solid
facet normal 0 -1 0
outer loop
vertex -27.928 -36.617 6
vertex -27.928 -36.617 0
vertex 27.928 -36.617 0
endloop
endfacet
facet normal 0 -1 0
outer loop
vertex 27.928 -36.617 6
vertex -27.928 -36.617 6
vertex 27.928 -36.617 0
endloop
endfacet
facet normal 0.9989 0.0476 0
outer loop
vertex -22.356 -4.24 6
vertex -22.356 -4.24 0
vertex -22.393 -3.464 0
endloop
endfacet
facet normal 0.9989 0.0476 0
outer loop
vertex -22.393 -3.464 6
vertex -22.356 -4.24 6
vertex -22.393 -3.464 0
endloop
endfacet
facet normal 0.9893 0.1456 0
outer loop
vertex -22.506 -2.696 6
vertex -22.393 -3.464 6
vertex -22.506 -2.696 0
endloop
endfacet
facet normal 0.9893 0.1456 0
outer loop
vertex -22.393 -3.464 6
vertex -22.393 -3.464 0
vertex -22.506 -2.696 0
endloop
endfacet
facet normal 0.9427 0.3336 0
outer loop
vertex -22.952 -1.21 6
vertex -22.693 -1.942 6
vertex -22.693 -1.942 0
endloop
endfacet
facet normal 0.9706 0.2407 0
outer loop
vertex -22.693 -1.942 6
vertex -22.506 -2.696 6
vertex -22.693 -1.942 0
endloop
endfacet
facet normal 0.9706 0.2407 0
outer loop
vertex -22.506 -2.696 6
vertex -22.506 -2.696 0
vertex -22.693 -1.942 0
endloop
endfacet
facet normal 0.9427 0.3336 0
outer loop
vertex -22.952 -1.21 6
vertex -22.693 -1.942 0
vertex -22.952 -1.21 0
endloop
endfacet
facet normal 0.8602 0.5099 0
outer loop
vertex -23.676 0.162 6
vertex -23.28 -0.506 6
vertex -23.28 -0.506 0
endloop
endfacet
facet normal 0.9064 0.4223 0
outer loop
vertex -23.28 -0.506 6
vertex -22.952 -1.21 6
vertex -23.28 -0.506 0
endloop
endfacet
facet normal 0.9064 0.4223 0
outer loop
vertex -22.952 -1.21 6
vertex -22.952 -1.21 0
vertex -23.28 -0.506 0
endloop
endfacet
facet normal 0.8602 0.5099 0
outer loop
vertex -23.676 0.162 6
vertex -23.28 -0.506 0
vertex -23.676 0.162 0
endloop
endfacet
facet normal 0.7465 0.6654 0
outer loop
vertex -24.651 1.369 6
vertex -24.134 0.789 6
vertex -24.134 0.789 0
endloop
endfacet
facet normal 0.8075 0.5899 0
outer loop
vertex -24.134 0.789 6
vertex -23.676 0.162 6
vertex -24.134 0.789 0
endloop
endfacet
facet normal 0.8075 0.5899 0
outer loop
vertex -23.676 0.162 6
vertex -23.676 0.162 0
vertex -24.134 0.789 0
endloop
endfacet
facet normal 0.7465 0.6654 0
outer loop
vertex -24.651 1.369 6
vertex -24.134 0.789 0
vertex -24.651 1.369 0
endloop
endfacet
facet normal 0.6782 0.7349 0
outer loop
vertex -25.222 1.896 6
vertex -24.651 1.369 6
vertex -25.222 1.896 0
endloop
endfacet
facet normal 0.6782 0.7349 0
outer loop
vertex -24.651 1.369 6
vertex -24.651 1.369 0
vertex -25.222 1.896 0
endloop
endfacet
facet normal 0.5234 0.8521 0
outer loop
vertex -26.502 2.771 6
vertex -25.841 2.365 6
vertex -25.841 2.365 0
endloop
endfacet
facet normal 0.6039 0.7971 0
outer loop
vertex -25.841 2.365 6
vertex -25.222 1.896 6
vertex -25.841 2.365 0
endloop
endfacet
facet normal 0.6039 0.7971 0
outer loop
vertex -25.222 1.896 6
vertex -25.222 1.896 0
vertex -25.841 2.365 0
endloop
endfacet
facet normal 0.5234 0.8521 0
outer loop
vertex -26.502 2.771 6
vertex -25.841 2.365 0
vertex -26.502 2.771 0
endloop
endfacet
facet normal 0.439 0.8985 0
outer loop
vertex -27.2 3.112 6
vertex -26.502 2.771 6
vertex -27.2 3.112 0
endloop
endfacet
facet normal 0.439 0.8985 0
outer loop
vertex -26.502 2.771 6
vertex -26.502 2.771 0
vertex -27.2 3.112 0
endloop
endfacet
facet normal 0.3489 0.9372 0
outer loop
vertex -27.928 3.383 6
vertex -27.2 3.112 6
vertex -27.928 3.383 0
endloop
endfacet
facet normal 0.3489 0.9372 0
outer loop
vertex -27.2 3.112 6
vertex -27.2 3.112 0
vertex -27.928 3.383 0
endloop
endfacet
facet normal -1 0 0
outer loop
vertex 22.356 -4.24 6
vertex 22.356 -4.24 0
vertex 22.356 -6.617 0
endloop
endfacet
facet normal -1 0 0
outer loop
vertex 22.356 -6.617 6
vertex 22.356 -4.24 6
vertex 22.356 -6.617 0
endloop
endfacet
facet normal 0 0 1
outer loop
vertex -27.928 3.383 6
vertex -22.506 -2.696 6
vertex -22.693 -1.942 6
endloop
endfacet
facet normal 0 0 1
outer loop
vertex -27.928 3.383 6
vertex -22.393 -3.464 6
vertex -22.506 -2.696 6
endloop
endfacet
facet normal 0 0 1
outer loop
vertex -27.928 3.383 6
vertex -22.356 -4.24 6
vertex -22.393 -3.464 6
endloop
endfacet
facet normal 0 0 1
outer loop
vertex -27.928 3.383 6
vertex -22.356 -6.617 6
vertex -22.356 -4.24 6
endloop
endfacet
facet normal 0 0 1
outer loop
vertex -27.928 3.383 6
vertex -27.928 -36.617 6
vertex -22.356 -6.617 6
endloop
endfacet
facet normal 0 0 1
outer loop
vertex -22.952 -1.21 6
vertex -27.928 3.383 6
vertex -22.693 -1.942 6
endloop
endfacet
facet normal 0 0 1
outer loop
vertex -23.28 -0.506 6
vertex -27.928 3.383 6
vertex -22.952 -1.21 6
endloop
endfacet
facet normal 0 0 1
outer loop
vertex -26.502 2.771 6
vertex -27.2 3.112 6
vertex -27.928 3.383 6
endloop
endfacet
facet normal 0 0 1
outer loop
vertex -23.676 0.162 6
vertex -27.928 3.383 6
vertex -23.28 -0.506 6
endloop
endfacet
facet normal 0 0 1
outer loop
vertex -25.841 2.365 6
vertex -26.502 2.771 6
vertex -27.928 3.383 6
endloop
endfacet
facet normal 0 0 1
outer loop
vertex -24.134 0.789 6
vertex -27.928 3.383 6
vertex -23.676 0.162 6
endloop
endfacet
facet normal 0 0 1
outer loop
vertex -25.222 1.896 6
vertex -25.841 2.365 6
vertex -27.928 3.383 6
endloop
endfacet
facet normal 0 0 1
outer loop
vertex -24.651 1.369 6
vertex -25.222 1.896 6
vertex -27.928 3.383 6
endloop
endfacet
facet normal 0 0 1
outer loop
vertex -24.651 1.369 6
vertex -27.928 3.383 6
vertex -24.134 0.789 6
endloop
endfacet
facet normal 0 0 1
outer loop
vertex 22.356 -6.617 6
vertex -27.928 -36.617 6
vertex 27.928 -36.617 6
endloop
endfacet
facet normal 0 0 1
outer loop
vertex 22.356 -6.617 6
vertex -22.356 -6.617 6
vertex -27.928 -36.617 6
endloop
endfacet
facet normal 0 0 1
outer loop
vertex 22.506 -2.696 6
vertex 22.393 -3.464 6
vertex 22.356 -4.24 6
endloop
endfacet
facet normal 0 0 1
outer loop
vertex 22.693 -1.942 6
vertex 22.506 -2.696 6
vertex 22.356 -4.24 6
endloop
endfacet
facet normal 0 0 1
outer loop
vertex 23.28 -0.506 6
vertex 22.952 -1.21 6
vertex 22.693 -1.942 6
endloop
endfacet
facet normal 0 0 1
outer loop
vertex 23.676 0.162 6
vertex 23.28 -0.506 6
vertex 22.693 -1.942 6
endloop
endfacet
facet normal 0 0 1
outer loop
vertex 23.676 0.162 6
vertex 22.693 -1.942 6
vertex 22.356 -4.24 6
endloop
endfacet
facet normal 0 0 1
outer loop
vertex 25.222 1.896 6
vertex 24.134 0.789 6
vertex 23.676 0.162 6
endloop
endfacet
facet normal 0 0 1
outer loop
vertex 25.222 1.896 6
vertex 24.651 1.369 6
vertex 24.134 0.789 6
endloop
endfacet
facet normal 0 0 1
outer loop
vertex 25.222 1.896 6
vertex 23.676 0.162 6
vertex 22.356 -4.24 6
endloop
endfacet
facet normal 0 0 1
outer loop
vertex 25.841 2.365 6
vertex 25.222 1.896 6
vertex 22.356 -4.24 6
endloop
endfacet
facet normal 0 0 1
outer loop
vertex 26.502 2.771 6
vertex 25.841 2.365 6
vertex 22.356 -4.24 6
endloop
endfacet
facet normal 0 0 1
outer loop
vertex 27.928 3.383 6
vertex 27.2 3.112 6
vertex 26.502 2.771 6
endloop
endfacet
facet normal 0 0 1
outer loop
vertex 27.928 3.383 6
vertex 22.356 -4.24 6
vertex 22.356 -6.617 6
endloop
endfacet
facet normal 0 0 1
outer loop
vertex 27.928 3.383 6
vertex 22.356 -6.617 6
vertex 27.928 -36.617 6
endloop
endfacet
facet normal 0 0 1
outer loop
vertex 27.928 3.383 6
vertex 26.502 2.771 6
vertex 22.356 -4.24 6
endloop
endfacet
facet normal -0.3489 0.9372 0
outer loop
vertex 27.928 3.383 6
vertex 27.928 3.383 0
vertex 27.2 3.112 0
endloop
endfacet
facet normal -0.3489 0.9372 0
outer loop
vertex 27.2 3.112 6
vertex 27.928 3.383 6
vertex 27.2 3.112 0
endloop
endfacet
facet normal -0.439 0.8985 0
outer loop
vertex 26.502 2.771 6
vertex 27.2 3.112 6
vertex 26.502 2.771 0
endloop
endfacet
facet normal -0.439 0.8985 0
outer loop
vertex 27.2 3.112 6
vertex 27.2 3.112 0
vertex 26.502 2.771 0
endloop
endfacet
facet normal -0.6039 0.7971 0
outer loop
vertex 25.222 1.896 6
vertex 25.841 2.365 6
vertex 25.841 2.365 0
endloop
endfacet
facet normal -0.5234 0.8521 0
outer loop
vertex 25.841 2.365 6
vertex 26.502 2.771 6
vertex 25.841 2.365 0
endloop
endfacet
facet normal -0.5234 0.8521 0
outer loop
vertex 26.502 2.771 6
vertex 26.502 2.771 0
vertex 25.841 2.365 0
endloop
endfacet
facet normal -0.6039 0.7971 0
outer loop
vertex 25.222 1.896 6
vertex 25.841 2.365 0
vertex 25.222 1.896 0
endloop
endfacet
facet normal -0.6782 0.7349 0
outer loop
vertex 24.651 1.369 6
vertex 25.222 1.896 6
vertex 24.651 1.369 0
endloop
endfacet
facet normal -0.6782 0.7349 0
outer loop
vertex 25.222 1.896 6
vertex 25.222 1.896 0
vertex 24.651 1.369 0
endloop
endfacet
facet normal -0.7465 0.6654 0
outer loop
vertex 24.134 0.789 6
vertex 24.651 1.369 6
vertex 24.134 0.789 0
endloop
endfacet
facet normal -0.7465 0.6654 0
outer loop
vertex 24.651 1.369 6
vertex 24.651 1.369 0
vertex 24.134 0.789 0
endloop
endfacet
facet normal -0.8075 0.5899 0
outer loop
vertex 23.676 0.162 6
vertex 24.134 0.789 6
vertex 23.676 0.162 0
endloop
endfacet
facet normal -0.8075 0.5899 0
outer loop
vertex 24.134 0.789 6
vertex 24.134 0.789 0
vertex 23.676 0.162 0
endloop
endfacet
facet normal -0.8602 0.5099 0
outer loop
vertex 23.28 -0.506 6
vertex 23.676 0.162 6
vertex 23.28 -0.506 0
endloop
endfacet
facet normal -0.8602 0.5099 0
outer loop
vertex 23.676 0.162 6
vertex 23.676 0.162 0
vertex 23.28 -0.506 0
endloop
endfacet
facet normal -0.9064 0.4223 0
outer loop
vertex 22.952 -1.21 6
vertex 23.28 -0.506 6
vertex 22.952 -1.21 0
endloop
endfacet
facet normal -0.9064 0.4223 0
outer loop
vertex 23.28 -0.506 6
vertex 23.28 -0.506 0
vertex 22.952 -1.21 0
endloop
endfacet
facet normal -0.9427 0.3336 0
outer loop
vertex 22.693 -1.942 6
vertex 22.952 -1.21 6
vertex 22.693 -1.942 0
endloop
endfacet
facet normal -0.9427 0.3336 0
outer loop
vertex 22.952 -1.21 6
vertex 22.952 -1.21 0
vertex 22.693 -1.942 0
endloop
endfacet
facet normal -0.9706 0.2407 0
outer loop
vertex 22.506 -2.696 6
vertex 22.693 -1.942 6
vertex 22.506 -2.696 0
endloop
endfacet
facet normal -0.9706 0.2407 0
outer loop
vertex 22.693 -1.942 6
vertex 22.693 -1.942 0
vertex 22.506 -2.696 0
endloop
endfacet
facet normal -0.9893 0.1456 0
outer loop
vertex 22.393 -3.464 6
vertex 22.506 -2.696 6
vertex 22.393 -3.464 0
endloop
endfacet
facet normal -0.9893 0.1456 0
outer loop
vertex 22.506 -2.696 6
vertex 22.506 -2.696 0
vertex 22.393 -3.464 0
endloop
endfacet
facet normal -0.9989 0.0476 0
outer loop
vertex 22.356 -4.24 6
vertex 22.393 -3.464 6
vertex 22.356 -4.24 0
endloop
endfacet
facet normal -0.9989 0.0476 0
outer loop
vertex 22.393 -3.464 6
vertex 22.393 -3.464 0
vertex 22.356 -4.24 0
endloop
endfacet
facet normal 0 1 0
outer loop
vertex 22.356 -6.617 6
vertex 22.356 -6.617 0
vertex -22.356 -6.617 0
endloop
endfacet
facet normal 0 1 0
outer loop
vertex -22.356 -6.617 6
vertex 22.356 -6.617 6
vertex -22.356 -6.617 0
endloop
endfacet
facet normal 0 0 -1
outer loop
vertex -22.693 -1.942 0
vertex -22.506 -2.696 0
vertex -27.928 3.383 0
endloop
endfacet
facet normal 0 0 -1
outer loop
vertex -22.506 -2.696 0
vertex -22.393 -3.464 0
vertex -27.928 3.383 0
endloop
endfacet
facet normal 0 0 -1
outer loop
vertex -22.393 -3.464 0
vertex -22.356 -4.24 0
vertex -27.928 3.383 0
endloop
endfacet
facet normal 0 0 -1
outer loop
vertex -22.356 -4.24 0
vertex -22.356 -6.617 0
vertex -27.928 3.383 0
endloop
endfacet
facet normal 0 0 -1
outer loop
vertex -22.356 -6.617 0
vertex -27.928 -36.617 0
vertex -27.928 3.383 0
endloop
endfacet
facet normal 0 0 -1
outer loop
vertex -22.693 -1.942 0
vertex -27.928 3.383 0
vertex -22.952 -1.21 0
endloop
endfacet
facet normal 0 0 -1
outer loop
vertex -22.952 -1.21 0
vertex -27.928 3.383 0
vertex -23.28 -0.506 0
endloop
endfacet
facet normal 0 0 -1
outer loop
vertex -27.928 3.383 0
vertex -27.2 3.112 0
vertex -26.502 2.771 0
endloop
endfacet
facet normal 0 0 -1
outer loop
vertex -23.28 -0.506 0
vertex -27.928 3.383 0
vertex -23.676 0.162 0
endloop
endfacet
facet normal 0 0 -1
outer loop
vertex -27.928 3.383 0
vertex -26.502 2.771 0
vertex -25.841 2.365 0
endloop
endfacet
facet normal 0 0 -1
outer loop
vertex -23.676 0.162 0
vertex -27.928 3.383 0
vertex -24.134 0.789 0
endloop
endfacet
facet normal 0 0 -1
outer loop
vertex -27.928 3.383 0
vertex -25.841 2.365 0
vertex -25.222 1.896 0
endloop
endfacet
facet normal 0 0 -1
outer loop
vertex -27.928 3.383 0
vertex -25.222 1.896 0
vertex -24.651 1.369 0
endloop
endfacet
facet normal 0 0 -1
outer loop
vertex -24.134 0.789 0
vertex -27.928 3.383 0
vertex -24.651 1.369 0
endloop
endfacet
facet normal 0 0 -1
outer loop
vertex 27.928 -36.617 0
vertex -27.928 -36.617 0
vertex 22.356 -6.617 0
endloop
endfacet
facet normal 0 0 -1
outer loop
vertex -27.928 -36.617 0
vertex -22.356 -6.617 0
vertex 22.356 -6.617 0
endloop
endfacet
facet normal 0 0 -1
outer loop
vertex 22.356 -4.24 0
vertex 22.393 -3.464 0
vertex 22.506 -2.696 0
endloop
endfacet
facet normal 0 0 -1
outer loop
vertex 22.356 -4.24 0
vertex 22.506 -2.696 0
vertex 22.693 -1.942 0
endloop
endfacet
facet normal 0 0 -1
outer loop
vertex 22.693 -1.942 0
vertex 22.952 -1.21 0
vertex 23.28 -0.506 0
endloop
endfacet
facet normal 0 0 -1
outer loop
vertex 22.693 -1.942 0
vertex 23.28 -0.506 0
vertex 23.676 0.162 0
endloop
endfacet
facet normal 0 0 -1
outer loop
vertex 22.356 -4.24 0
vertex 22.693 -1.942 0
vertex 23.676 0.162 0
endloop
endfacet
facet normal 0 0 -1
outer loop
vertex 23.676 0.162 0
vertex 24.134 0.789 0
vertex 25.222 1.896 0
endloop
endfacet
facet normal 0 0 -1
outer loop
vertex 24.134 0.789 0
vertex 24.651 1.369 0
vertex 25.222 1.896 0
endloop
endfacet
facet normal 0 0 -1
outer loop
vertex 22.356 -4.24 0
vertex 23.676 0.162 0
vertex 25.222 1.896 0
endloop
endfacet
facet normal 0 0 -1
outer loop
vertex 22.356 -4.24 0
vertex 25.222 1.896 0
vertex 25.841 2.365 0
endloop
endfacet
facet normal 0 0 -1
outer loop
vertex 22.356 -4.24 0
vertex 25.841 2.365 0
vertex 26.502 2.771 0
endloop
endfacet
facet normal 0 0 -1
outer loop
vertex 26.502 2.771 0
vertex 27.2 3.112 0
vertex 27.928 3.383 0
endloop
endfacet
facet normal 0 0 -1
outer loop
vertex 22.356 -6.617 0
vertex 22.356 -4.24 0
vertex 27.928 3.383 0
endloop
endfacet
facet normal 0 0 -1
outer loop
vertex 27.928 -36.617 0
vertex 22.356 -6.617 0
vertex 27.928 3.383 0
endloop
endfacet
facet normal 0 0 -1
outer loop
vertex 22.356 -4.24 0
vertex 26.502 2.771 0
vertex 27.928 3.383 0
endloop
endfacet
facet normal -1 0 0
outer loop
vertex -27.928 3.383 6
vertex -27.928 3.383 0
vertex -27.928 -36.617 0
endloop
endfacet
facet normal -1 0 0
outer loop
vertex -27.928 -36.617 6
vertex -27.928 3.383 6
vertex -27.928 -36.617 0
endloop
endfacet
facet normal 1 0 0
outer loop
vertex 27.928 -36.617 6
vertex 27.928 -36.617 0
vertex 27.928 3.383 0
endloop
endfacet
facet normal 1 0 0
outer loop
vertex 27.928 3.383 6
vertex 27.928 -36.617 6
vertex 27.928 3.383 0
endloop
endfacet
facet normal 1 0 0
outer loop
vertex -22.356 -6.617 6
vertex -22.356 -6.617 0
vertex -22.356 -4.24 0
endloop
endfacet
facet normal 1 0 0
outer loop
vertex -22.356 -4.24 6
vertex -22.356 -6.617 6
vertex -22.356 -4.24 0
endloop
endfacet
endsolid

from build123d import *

# Parameters (mm, degrees)
BOSS_EXTRUDE1_DEPTH = 6
FILLET7_R           = 8
FILLET8_R           = 8


with BuildPart() as part:
    # Sketch1 → Boss-Extrude1 (new body)
    with BuildSketch(Plane.XY):
        Polygon((-27.927868544, -36.616915423), (27.927868544, -36.616915423), (27.927868544, 3.383084577), (22.35572924, 3.383084577), (22.35572924, -6.616915423), (-22.35572924, -6.616915423), (-22.35572924, 3.383084577), (-27.927868544, 3.383084577), align=None)
    extrude(amount=BOSS_EXTRUDE1_DEPTH)

    # Fillet7
    # the kernel refuses this fillet: 8 mm, written as the material it takes off along each edge
    with BuildSketch(Plane(origin=(-22.35572924, 3.383084577, -19.056739693), x_dir=(0, -1, 0), z_dir=(0, 0, 1))) as fillet7_piece_1:
        with BuildLine():
            CenterArc((7.622695877, -8), FILLET7_R, 90, 72.333104018)
            Line((0, -5.572139303), (-0.152453918, -5.52358209))
            ThreePointArc((-0.152453918, -5.52358209), (-0.16, -2.786069652), (-0.16, 0))
            Line((-0.16, 0), (0, 0.16))
            Line((0, 0.16), (7.622695877, 0.16))
            Line((7.622695877, 0.16), (7.622695877, 0))
        make_face()
    extrude(amount=44.113479387, mode=Mode.SUBTRACT)

    # Fillet8
    # the kernel refuses this fillet: 8 mm, written as the material it takes off along each edge
    with BuildSketch(Plane(origin=(22.35572924, 3.383084577, -19.056739693), x_dir=(1, 0, 0), z_dir=(0, 0, 1))) as fillet8_piece_1:
        with BuildLine():
            CenterArc((8, -7.622695877), FILLET8_R, 107.666895982, 72.333104018)
            Line((0, -7.622695877), (-0.16, -7.622695877))
            Line((-0.16, -7.622695877), (-0.16, 0))
            Line((-0.16, 0), (0, 0.16))
            ThreePointArc((0, 0.16), (2.786069652, 0.16), (5.52358209, 0.152453918))
            Line((5.52358209, 0.152453918), (5.572139303, 0))
        make_face()
    extrude(amount=44.113479387, mode=Mode.SUBTRACT)


solid = part.part
